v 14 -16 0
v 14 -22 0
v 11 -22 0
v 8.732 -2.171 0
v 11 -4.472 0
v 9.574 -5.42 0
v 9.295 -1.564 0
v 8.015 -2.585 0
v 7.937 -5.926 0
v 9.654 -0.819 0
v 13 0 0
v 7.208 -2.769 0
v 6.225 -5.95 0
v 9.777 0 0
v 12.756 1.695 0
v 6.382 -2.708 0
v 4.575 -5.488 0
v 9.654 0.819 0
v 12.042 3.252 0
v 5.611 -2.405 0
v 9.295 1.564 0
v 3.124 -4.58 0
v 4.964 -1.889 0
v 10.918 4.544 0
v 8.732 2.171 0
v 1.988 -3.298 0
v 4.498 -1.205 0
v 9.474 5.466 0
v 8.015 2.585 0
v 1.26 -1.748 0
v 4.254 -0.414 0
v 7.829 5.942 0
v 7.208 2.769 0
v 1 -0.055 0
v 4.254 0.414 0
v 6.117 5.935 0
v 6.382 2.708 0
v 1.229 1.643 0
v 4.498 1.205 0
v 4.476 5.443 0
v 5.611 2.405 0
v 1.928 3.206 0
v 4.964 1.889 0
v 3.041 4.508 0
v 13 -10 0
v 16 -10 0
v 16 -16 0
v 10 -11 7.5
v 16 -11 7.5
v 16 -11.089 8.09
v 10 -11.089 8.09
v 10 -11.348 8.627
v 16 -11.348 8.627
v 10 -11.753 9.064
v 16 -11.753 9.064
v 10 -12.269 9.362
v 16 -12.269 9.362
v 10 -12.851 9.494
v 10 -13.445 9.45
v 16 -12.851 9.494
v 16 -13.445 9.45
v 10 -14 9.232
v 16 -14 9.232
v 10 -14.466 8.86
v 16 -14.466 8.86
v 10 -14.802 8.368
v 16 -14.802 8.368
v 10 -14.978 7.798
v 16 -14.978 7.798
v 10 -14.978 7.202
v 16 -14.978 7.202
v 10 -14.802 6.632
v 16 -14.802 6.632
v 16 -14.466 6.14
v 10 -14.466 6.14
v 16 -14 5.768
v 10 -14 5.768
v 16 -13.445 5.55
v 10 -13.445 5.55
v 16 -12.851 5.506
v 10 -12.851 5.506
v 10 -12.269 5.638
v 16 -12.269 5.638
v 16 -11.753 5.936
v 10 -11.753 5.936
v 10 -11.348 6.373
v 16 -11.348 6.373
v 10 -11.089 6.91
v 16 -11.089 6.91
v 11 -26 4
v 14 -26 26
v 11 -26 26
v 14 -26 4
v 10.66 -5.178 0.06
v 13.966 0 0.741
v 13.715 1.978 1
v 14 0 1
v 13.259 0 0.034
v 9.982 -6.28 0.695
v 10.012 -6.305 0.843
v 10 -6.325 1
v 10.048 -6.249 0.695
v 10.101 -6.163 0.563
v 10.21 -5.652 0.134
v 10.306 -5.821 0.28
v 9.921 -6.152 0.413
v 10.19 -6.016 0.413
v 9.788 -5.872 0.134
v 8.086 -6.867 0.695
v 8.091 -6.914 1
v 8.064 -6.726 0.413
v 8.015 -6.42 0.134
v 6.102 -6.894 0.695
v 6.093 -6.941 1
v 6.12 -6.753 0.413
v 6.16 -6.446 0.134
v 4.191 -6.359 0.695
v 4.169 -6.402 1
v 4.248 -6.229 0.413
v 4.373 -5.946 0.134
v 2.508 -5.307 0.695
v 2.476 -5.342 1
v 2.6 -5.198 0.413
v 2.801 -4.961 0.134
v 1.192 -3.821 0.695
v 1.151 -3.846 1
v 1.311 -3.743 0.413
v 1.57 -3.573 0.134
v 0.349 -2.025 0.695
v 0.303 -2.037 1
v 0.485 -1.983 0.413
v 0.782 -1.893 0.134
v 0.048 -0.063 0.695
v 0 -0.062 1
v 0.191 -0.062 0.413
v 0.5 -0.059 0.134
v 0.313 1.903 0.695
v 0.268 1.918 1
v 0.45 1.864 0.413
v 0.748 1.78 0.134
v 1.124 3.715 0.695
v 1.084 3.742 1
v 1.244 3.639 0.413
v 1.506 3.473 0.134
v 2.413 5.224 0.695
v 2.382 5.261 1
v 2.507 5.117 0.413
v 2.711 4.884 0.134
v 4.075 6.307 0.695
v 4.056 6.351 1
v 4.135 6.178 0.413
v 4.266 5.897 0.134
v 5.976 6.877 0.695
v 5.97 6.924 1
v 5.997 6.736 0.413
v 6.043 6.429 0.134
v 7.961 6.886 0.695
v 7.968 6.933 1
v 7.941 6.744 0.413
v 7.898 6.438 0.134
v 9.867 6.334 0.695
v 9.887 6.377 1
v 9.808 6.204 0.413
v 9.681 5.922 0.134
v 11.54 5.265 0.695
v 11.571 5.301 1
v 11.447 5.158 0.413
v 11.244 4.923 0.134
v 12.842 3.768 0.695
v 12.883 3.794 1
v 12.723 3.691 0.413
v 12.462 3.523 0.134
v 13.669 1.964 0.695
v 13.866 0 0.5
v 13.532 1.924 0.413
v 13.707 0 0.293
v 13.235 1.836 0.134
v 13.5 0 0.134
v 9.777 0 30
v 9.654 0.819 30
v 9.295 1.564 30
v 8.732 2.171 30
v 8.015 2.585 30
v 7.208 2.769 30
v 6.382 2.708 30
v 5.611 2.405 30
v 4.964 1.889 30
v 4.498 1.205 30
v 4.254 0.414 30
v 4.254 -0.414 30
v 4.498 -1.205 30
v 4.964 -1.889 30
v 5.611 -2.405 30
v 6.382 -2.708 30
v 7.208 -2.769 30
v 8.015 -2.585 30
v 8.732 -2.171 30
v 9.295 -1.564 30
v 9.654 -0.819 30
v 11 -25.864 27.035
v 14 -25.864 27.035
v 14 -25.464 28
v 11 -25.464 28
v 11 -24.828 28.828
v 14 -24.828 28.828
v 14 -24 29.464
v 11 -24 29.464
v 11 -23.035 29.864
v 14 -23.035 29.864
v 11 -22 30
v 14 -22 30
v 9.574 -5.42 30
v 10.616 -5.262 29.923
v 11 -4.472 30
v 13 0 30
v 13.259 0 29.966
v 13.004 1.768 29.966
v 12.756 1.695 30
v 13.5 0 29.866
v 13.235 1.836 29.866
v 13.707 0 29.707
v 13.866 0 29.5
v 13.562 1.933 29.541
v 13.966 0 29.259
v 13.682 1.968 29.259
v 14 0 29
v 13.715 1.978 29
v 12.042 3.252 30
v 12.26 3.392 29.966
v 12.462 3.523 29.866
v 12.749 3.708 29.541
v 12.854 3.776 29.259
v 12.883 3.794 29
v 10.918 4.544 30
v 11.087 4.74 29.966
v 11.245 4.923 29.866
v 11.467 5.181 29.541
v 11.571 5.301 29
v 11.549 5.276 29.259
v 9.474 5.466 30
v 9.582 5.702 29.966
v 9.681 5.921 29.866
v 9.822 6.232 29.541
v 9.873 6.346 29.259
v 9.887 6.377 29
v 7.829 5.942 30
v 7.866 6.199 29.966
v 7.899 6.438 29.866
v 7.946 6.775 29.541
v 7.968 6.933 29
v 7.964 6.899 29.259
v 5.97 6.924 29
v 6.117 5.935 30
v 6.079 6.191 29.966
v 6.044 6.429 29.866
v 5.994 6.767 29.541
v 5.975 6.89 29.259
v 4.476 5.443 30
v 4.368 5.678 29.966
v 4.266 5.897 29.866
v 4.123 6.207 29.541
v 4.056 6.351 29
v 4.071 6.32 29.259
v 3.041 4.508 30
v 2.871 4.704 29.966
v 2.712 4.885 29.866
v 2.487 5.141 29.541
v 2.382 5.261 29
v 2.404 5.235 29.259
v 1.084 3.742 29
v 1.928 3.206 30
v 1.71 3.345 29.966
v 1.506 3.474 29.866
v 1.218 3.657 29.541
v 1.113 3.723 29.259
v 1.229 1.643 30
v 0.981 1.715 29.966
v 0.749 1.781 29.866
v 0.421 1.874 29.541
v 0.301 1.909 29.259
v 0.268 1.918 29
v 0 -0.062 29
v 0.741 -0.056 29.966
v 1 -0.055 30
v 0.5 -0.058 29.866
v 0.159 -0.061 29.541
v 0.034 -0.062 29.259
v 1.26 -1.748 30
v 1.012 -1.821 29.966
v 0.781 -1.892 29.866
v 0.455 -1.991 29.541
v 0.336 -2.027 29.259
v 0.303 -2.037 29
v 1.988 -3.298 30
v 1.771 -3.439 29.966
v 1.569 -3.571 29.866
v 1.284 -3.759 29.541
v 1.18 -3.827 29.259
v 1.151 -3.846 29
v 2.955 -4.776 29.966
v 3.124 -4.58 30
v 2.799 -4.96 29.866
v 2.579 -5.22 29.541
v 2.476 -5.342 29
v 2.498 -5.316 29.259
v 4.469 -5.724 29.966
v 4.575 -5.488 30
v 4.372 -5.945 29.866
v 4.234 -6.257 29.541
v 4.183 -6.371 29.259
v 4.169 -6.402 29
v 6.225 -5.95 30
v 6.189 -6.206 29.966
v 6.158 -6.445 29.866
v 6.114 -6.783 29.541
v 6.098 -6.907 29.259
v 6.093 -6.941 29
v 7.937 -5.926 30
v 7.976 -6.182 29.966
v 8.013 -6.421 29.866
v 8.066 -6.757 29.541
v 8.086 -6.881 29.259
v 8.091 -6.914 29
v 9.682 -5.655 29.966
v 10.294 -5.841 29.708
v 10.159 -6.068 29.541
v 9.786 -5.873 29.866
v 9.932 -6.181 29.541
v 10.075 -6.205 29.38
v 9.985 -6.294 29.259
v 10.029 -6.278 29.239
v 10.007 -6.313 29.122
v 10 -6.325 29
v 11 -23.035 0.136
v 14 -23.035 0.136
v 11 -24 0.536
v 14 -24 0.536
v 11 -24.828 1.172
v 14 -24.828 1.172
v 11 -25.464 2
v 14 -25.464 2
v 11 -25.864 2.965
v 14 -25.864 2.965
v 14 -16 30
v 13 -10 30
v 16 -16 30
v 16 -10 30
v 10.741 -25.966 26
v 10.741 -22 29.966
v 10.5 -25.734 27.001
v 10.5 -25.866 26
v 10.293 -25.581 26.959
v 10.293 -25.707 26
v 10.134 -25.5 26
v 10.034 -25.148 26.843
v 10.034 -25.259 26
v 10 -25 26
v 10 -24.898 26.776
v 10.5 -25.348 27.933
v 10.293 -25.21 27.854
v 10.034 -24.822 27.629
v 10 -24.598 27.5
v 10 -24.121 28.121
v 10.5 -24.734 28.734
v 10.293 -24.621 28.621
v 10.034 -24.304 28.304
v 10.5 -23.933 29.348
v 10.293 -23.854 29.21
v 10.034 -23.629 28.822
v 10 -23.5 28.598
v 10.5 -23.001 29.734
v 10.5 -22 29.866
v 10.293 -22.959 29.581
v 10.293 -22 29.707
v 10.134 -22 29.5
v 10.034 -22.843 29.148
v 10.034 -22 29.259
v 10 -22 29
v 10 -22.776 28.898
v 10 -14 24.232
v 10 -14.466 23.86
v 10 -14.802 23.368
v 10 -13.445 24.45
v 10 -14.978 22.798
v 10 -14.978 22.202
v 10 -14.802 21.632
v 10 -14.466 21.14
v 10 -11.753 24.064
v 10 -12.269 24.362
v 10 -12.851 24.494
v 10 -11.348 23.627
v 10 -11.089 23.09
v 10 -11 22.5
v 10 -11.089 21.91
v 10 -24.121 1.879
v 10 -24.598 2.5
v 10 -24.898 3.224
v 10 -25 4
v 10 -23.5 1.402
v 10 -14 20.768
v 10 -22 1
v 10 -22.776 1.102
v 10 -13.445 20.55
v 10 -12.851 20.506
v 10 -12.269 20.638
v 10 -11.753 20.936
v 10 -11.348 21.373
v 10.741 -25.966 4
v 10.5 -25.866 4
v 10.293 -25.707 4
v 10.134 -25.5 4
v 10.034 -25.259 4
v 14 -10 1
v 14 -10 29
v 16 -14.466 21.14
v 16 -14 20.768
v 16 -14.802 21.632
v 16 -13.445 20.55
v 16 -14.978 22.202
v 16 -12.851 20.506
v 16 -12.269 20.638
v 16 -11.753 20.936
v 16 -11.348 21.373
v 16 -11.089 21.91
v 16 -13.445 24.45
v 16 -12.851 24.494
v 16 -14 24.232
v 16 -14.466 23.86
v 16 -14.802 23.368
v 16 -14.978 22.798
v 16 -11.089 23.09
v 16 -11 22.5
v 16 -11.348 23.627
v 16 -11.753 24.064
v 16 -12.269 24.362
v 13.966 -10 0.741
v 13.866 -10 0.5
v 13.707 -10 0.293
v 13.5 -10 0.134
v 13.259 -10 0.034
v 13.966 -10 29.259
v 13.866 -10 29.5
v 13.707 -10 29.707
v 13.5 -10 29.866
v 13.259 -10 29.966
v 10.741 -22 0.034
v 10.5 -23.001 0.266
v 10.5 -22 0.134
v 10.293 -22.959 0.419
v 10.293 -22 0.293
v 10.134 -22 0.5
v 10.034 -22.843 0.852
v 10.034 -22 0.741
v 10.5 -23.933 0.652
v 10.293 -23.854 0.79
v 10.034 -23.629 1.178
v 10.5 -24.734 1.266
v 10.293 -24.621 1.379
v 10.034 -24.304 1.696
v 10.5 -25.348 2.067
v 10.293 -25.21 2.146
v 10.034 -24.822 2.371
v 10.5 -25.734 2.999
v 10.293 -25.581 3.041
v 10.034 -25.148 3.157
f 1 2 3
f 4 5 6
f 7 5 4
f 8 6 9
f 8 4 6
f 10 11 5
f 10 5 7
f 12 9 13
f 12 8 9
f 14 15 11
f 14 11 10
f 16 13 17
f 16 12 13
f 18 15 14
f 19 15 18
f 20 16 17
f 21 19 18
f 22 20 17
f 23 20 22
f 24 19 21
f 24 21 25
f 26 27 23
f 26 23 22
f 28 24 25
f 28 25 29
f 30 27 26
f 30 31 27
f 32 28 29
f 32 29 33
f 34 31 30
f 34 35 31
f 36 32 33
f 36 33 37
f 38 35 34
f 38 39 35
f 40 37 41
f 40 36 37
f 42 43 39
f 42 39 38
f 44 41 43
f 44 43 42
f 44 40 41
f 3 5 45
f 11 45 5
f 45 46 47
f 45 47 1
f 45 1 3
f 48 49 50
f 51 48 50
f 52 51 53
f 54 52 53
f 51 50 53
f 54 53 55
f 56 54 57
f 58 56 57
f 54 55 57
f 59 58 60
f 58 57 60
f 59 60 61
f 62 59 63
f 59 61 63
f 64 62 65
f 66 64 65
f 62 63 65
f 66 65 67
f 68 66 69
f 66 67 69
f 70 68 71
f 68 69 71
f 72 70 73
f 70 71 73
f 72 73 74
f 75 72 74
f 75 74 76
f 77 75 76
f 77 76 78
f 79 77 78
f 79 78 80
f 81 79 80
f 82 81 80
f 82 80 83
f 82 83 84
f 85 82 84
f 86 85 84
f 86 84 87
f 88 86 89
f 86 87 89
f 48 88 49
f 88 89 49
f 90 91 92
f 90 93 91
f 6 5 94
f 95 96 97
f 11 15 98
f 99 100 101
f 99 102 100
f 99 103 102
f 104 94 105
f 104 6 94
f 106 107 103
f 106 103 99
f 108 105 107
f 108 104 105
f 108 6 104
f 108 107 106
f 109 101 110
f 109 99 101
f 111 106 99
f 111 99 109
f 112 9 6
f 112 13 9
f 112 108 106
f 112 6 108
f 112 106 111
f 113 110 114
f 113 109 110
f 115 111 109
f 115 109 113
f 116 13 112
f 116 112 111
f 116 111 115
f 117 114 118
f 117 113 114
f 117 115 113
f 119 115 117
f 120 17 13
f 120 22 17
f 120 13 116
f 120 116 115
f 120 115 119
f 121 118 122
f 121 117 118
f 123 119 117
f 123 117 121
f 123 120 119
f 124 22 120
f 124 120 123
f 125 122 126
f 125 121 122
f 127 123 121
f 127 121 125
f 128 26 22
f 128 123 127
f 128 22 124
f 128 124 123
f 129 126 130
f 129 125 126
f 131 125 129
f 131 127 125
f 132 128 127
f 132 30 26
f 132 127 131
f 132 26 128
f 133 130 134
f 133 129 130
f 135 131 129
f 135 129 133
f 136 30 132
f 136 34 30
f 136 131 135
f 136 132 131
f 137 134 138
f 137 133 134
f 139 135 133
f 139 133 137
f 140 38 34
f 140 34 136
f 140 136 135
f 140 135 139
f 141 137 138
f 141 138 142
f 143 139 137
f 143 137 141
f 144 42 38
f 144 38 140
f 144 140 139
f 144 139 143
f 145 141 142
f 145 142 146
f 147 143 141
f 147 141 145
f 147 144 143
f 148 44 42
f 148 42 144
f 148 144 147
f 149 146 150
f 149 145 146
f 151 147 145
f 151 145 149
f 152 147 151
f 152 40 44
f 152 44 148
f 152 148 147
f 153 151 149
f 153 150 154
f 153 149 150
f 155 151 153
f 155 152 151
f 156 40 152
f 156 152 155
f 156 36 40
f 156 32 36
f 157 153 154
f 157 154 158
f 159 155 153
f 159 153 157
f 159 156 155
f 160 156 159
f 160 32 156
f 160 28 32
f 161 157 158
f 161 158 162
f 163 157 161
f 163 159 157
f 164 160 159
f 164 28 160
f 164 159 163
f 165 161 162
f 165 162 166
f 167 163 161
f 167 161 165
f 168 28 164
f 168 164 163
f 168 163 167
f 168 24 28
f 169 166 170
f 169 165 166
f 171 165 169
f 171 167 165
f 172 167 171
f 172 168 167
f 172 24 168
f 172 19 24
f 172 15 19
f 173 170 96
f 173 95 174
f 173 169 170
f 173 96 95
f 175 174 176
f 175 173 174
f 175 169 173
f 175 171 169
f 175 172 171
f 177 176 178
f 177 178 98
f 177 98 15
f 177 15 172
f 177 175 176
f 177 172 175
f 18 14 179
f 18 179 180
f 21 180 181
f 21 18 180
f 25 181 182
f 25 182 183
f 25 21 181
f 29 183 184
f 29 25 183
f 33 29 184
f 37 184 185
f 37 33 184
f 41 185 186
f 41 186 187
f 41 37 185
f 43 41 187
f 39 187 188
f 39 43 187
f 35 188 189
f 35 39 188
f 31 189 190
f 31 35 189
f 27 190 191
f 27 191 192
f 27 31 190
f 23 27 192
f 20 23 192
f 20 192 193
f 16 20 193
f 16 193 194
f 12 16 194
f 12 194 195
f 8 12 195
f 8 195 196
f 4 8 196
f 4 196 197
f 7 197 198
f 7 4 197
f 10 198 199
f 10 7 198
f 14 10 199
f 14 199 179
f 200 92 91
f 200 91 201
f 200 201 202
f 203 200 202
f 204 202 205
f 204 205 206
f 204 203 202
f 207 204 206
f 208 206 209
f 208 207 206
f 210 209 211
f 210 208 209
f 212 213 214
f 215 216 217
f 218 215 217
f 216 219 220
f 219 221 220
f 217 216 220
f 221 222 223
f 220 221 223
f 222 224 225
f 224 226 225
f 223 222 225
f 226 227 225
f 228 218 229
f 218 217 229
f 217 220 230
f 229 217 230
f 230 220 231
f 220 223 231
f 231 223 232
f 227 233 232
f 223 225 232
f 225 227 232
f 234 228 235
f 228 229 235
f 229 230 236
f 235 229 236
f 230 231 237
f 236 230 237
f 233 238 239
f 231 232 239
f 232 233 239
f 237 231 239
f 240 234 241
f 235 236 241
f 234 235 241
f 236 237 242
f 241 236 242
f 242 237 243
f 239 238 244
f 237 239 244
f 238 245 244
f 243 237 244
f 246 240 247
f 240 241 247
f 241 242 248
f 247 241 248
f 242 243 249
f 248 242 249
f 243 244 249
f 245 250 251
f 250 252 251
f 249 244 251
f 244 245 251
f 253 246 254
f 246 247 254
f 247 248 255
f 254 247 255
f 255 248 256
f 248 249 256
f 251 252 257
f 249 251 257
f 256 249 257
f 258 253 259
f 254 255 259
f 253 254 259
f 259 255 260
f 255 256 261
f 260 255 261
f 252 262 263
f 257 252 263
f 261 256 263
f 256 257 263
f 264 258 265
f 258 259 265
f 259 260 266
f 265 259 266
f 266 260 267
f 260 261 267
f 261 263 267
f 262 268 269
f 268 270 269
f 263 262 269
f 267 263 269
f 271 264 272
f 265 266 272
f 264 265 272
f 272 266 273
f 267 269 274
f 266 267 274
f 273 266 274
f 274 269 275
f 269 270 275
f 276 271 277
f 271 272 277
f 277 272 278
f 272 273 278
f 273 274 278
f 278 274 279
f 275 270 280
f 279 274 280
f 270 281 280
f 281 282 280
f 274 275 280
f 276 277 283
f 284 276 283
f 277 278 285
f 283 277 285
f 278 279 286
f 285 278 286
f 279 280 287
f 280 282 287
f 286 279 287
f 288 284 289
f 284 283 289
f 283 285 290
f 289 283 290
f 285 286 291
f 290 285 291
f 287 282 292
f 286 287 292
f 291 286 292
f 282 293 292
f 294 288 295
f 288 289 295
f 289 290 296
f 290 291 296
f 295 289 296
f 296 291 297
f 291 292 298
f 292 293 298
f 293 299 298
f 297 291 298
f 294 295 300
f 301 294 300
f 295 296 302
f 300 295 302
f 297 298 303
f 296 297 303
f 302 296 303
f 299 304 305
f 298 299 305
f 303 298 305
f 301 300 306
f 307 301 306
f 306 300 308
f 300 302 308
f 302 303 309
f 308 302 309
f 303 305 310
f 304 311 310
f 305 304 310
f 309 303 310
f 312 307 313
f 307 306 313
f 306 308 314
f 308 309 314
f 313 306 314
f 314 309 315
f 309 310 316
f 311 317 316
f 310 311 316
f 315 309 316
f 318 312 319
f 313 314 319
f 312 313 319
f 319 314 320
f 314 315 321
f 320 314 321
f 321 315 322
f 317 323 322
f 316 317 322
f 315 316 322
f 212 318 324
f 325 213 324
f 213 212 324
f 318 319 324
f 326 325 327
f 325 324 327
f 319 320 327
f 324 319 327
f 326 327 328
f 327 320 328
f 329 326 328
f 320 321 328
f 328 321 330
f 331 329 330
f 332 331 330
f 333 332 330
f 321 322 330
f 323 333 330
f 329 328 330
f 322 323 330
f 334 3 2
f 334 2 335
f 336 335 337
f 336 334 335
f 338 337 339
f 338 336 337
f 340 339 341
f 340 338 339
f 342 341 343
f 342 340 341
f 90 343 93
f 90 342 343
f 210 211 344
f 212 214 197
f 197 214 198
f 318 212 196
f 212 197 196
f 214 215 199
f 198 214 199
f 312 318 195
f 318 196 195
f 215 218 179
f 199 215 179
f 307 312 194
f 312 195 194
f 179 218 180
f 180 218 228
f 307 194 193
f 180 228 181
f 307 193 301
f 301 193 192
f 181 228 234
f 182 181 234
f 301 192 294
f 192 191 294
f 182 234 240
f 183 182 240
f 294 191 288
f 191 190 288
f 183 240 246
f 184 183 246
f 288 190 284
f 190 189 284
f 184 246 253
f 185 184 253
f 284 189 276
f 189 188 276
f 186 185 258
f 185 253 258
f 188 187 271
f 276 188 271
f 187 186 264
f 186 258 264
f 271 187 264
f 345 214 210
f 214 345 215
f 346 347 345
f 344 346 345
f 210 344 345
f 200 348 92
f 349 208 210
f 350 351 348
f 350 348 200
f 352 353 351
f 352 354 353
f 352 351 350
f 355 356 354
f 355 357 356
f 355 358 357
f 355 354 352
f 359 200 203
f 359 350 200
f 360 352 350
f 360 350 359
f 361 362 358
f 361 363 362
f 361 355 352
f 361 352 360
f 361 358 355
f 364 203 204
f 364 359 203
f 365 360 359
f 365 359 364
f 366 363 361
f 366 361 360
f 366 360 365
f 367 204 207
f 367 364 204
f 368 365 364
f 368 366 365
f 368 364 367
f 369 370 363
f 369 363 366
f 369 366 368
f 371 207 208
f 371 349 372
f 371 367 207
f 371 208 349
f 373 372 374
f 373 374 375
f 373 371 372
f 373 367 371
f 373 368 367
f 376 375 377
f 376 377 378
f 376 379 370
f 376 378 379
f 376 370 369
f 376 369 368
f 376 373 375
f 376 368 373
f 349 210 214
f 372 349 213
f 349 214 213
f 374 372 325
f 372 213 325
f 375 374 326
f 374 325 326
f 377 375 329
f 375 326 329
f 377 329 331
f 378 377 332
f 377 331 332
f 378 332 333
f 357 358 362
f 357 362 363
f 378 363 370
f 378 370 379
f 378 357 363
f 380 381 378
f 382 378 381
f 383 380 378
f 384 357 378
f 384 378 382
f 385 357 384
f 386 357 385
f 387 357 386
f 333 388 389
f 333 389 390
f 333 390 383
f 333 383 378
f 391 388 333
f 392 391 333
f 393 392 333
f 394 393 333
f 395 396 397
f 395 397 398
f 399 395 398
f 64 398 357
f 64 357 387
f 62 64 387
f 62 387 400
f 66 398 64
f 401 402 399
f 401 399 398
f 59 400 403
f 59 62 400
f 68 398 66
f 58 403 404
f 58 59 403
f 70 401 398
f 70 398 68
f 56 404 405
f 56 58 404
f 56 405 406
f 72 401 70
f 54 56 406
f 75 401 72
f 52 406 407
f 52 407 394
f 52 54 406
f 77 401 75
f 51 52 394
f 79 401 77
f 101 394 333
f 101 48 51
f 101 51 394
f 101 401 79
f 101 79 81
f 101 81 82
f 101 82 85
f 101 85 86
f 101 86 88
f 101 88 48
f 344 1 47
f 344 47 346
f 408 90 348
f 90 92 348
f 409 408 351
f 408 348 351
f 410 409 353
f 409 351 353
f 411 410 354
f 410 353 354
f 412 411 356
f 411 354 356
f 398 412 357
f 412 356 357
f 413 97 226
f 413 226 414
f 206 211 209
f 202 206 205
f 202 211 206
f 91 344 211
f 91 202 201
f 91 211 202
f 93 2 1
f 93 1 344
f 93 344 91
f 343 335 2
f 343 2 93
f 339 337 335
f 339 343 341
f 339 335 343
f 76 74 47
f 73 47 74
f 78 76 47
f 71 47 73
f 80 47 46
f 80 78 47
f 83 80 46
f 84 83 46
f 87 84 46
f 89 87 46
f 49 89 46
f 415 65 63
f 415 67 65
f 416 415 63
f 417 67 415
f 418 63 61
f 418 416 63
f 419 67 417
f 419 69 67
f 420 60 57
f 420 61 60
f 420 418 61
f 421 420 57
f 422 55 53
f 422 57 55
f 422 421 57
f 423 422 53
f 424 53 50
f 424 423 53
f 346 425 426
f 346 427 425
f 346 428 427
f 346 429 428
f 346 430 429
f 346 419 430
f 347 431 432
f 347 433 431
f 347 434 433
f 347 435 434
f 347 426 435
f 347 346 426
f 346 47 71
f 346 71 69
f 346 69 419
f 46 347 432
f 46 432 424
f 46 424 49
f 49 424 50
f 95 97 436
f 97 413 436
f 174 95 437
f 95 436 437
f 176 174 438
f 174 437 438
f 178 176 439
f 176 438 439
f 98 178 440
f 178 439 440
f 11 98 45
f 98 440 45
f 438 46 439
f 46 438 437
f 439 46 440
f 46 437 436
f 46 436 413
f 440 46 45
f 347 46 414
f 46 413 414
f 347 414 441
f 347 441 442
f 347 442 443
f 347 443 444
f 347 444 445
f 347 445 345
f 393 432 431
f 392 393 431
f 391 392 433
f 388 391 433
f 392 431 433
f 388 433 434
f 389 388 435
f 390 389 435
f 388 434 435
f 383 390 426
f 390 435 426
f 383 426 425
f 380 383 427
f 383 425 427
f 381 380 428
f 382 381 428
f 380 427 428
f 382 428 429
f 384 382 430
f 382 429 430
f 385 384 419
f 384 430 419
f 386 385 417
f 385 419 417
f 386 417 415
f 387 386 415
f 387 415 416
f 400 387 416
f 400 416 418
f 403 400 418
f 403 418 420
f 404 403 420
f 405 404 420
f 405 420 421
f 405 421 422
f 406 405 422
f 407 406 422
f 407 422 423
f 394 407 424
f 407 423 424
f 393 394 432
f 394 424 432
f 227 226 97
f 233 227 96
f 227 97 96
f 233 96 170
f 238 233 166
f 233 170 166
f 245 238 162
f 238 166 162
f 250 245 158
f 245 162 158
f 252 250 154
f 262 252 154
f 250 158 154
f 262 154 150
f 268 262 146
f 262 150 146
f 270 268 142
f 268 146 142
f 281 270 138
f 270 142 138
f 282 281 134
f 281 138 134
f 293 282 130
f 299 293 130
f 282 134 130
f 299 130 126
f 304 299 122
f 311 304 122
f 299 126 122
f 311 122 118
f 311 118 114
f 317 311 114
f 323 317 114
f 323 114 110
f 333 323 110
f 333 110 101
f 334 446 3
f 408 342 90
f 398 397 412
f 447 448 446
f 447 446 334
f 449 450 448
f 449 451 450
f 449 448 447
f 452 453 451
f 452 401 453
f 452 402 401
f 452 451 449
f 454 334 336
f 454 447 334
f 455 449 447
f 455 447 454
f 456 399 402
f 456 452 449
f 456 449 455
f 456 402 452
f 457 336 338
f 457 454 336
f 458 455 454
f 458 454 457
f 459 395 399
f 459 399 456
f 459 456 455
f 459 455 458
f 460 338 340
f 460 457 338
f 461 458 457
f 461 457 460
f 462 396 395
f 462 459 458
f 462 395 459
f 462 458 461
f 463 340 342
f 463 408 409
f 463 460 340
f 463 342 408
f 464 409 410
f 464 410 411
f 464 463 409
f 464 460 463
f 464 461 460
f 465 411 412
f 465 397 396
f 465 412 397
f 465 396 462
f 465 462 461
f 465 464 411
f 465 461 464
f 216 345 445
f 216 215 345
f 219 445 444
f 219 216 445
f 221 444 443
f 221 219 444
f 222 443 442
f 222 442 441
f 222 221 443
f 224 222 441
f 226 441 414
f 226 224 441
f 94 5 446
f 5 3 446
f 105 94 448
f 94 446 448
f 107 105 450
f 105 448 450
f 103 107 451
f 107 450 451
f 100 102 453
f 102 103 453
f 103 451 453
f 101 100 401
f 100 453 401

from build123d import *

# Parameters (mm, degrees)
SKETCH_R     = 2.777235
PAD_DEPTH    = 30
SKETCH001_W  = 6
SKETCH001_H  = 30
PAD001_DEPTH = 2
SKETCH002_R  = 2
POCKET_DEPTH = 6
FILLET_R     = 4
FILLET001_R  = 4
FILLET002_R  = 1
FILLET003_R  = 1
FILLET004_R  = 1


with BuildPart() as part:
    # Sketch → Pad (new body)
    with BuildSketch(Plane.XY):
        with BuildLine():
            Line((14, 0), (14, -26))
            Line((14, -26), (10, -26))
            Line((10, -26), (10, -6.324555))
            ThreePointArc((14, 0), (1.08392, 3.741657), (10, -6.324555))
        make_face()
        with Locations((7, 0)):
            Circle(SKETCH_R, mode=Mode.SUBTRACT)
    extrude(amount=PAD_DEPTH)

    # Sketch001 → Pad001 (new body)
    with BuildSketch(Plane.YZ.offset(14)):
        with Locations((-13, 15)):
            Rectangle(SKETCH001_W, SKETCH001_H)
    extrude(amount=PAD001_DEPTH)

    # Sketch002 → Pocket (cut)
    with BuildSketch(Plane.YZ.offset(16)):
        with Locations((-13, 22.5)):
            Circle(SKETCH002_R)
        with Locations((-13, 7.5)):
            Circle(SKETCH002_R)
    extrude(amount=-POCKET_DEPTH, mode=Mode.SUBTRACT)

    # Fillet
    fillet_edges = [part.edges().sort_by_distance(p)[0] for p in [
        (12, -26, 0),
    ]]
    fillet(fillet_edges, radius=FILLET_R)

    # Fillet001
    fillet001_edges = [part.edges().sort_by_distance(p)[0] for p in [
        (12, -26, 30),
    ]]
    fillet(fillet001_edges, radius=FILLET001_R)

    # Fillet002
    fillet002_edges = [part.edges().sort_by_distance(p)[0] for p in [
        (10, -26, 15),
    ]]
    fillet(fillet002_edges, radius=FILLET002_R)

    # Fillet003
    fillet003_edges = [part.edges().sort_by_distance(p)[0] for p in [
        (1.08392, 3.741657, 30),
    ]]
    fillet(fillet003_edges, radius=FILLET003_R)

    # Fillet004
    fillet004_edges = [part.edges().sort_by_distance(p)[0] for p in [
        (1.08392, 3.741657, 0),
    ]]
    fillet(fillet004_edges, radius=FILLET004_R)


solid = part.part
